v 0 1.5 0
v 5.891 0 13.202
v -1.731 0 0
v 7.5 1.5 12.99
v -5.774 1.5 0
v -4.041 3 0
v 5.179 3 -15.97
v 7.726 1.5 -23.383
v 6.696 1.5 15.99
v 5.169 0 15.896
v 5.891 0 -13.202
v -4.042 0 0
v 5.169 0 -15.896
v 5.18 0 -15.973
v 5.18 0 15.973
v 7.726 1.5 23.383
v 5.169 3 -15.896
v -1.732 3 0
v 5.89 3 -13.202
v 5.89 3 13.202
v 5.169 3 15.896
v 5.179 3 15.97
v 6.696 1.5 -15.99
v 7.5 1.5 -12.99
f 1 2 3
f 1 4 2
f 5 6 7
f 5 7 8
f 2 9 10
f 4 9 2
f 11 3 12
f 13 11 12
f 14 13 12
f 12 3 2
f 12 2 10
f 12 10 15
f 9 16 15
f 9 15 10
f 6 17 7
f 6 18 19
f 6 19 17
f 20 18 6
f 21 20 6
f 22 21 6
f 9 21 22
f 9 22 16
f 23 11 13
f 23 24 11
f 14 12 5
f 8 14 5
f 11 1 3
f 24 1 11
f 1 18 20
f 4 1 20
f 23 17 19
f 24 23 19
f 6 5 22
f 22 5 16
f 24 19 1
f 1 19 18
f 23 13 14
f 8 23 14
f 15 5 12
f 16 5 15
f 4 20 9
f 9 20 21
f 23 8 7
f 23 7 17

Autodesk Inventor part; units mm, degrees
ref_plane "YZ Plane" through (0, 0, 0) normal (1, 0, 0) x (0, 1, 0)
ref_plane "XZ Plane" through (0, 0, 0) normal (0, 1, 0) x (-1, 0, 0)
ref_plane "XY Plane" through (0, 0, 0) normal (0, 0, 1) x (1, 0, 0)
sketch "Sketch1" plane through (0, 0, 0) normal (0, 1, 0) x (-1, 0, 0)
  line L0 (5.7735, 0) -> (-7.7265, 23.3827)
  line L1 (-7.7265, 23.3827) -> (-6.6962, 15.9904)
  line L2 (-6.6962, 15.9904) -> (-7.5, 12.9904)
  line L3 (-7.5, 12.9904) -> (0, 0)
  line L4 (0, 0) -> (-7.5, -12.9904)
  line L5 (-7.5, -12.9904) -> (-6.6962, -15.9904)
  line L6 (-6.6962, -15.9904) -> (-7.7265, -23.3827)
  line L7 (-7.7265, -23.3827) -> (5.7735, 0)
  line L8 (14.7308, 0) -> (-3.2807, 0) construction
  dimension "d0" = 0
  dimension "d1" = 0
  dimension "d2" = 0
  dimension "d3" = 60
  dimension "d4" = 60
  dimension "d5" = 5
  dimension "d6" = 135
  dimension "d7" = 135
  dimension "d8" = 15
  dimension "d9" = 15
  dimension "d10" = 3
  dimension "d11" = 3
  dimension "d12" = 27
  dimension "d13" = 27
extrude "Extrusion1" add sketch "Sketch1" along normal blind 3
chamfer "Chamfer1" distance 1.5 angle 45 6 edges at (3.75, 3, 6.4952) (3.75, 3, -6.4952) (7.0981, 3, -14.4904) (7.0981, 3, 14.4904) (7.2113, 3, 19.6865) (7.2113, 3, -19.6865)
chamfer "Chamfer2" distance 1.5 angle 45 2 edges at (-0.0217, 3, 9.9623) (-0.0217, 3, -9.9623)
chamfer "Chamfer3" distance 1.5 angle 45 6 edges at (3.75, 0, -6.4952) (7.0981, 0, -14.4904) (7.2113, 0, -19.6865) (3.75, 0, 6.4952) (7.2113, 0, 19.6865) (7.0981, 0, 14.4904)
chamfer "Chamfer4" distance 1.5 angle 45 2 edges at (-0.0214, 0, -9.9629) (-0.0214, 0, 9.9629)
properties part number "SpeedRank"
